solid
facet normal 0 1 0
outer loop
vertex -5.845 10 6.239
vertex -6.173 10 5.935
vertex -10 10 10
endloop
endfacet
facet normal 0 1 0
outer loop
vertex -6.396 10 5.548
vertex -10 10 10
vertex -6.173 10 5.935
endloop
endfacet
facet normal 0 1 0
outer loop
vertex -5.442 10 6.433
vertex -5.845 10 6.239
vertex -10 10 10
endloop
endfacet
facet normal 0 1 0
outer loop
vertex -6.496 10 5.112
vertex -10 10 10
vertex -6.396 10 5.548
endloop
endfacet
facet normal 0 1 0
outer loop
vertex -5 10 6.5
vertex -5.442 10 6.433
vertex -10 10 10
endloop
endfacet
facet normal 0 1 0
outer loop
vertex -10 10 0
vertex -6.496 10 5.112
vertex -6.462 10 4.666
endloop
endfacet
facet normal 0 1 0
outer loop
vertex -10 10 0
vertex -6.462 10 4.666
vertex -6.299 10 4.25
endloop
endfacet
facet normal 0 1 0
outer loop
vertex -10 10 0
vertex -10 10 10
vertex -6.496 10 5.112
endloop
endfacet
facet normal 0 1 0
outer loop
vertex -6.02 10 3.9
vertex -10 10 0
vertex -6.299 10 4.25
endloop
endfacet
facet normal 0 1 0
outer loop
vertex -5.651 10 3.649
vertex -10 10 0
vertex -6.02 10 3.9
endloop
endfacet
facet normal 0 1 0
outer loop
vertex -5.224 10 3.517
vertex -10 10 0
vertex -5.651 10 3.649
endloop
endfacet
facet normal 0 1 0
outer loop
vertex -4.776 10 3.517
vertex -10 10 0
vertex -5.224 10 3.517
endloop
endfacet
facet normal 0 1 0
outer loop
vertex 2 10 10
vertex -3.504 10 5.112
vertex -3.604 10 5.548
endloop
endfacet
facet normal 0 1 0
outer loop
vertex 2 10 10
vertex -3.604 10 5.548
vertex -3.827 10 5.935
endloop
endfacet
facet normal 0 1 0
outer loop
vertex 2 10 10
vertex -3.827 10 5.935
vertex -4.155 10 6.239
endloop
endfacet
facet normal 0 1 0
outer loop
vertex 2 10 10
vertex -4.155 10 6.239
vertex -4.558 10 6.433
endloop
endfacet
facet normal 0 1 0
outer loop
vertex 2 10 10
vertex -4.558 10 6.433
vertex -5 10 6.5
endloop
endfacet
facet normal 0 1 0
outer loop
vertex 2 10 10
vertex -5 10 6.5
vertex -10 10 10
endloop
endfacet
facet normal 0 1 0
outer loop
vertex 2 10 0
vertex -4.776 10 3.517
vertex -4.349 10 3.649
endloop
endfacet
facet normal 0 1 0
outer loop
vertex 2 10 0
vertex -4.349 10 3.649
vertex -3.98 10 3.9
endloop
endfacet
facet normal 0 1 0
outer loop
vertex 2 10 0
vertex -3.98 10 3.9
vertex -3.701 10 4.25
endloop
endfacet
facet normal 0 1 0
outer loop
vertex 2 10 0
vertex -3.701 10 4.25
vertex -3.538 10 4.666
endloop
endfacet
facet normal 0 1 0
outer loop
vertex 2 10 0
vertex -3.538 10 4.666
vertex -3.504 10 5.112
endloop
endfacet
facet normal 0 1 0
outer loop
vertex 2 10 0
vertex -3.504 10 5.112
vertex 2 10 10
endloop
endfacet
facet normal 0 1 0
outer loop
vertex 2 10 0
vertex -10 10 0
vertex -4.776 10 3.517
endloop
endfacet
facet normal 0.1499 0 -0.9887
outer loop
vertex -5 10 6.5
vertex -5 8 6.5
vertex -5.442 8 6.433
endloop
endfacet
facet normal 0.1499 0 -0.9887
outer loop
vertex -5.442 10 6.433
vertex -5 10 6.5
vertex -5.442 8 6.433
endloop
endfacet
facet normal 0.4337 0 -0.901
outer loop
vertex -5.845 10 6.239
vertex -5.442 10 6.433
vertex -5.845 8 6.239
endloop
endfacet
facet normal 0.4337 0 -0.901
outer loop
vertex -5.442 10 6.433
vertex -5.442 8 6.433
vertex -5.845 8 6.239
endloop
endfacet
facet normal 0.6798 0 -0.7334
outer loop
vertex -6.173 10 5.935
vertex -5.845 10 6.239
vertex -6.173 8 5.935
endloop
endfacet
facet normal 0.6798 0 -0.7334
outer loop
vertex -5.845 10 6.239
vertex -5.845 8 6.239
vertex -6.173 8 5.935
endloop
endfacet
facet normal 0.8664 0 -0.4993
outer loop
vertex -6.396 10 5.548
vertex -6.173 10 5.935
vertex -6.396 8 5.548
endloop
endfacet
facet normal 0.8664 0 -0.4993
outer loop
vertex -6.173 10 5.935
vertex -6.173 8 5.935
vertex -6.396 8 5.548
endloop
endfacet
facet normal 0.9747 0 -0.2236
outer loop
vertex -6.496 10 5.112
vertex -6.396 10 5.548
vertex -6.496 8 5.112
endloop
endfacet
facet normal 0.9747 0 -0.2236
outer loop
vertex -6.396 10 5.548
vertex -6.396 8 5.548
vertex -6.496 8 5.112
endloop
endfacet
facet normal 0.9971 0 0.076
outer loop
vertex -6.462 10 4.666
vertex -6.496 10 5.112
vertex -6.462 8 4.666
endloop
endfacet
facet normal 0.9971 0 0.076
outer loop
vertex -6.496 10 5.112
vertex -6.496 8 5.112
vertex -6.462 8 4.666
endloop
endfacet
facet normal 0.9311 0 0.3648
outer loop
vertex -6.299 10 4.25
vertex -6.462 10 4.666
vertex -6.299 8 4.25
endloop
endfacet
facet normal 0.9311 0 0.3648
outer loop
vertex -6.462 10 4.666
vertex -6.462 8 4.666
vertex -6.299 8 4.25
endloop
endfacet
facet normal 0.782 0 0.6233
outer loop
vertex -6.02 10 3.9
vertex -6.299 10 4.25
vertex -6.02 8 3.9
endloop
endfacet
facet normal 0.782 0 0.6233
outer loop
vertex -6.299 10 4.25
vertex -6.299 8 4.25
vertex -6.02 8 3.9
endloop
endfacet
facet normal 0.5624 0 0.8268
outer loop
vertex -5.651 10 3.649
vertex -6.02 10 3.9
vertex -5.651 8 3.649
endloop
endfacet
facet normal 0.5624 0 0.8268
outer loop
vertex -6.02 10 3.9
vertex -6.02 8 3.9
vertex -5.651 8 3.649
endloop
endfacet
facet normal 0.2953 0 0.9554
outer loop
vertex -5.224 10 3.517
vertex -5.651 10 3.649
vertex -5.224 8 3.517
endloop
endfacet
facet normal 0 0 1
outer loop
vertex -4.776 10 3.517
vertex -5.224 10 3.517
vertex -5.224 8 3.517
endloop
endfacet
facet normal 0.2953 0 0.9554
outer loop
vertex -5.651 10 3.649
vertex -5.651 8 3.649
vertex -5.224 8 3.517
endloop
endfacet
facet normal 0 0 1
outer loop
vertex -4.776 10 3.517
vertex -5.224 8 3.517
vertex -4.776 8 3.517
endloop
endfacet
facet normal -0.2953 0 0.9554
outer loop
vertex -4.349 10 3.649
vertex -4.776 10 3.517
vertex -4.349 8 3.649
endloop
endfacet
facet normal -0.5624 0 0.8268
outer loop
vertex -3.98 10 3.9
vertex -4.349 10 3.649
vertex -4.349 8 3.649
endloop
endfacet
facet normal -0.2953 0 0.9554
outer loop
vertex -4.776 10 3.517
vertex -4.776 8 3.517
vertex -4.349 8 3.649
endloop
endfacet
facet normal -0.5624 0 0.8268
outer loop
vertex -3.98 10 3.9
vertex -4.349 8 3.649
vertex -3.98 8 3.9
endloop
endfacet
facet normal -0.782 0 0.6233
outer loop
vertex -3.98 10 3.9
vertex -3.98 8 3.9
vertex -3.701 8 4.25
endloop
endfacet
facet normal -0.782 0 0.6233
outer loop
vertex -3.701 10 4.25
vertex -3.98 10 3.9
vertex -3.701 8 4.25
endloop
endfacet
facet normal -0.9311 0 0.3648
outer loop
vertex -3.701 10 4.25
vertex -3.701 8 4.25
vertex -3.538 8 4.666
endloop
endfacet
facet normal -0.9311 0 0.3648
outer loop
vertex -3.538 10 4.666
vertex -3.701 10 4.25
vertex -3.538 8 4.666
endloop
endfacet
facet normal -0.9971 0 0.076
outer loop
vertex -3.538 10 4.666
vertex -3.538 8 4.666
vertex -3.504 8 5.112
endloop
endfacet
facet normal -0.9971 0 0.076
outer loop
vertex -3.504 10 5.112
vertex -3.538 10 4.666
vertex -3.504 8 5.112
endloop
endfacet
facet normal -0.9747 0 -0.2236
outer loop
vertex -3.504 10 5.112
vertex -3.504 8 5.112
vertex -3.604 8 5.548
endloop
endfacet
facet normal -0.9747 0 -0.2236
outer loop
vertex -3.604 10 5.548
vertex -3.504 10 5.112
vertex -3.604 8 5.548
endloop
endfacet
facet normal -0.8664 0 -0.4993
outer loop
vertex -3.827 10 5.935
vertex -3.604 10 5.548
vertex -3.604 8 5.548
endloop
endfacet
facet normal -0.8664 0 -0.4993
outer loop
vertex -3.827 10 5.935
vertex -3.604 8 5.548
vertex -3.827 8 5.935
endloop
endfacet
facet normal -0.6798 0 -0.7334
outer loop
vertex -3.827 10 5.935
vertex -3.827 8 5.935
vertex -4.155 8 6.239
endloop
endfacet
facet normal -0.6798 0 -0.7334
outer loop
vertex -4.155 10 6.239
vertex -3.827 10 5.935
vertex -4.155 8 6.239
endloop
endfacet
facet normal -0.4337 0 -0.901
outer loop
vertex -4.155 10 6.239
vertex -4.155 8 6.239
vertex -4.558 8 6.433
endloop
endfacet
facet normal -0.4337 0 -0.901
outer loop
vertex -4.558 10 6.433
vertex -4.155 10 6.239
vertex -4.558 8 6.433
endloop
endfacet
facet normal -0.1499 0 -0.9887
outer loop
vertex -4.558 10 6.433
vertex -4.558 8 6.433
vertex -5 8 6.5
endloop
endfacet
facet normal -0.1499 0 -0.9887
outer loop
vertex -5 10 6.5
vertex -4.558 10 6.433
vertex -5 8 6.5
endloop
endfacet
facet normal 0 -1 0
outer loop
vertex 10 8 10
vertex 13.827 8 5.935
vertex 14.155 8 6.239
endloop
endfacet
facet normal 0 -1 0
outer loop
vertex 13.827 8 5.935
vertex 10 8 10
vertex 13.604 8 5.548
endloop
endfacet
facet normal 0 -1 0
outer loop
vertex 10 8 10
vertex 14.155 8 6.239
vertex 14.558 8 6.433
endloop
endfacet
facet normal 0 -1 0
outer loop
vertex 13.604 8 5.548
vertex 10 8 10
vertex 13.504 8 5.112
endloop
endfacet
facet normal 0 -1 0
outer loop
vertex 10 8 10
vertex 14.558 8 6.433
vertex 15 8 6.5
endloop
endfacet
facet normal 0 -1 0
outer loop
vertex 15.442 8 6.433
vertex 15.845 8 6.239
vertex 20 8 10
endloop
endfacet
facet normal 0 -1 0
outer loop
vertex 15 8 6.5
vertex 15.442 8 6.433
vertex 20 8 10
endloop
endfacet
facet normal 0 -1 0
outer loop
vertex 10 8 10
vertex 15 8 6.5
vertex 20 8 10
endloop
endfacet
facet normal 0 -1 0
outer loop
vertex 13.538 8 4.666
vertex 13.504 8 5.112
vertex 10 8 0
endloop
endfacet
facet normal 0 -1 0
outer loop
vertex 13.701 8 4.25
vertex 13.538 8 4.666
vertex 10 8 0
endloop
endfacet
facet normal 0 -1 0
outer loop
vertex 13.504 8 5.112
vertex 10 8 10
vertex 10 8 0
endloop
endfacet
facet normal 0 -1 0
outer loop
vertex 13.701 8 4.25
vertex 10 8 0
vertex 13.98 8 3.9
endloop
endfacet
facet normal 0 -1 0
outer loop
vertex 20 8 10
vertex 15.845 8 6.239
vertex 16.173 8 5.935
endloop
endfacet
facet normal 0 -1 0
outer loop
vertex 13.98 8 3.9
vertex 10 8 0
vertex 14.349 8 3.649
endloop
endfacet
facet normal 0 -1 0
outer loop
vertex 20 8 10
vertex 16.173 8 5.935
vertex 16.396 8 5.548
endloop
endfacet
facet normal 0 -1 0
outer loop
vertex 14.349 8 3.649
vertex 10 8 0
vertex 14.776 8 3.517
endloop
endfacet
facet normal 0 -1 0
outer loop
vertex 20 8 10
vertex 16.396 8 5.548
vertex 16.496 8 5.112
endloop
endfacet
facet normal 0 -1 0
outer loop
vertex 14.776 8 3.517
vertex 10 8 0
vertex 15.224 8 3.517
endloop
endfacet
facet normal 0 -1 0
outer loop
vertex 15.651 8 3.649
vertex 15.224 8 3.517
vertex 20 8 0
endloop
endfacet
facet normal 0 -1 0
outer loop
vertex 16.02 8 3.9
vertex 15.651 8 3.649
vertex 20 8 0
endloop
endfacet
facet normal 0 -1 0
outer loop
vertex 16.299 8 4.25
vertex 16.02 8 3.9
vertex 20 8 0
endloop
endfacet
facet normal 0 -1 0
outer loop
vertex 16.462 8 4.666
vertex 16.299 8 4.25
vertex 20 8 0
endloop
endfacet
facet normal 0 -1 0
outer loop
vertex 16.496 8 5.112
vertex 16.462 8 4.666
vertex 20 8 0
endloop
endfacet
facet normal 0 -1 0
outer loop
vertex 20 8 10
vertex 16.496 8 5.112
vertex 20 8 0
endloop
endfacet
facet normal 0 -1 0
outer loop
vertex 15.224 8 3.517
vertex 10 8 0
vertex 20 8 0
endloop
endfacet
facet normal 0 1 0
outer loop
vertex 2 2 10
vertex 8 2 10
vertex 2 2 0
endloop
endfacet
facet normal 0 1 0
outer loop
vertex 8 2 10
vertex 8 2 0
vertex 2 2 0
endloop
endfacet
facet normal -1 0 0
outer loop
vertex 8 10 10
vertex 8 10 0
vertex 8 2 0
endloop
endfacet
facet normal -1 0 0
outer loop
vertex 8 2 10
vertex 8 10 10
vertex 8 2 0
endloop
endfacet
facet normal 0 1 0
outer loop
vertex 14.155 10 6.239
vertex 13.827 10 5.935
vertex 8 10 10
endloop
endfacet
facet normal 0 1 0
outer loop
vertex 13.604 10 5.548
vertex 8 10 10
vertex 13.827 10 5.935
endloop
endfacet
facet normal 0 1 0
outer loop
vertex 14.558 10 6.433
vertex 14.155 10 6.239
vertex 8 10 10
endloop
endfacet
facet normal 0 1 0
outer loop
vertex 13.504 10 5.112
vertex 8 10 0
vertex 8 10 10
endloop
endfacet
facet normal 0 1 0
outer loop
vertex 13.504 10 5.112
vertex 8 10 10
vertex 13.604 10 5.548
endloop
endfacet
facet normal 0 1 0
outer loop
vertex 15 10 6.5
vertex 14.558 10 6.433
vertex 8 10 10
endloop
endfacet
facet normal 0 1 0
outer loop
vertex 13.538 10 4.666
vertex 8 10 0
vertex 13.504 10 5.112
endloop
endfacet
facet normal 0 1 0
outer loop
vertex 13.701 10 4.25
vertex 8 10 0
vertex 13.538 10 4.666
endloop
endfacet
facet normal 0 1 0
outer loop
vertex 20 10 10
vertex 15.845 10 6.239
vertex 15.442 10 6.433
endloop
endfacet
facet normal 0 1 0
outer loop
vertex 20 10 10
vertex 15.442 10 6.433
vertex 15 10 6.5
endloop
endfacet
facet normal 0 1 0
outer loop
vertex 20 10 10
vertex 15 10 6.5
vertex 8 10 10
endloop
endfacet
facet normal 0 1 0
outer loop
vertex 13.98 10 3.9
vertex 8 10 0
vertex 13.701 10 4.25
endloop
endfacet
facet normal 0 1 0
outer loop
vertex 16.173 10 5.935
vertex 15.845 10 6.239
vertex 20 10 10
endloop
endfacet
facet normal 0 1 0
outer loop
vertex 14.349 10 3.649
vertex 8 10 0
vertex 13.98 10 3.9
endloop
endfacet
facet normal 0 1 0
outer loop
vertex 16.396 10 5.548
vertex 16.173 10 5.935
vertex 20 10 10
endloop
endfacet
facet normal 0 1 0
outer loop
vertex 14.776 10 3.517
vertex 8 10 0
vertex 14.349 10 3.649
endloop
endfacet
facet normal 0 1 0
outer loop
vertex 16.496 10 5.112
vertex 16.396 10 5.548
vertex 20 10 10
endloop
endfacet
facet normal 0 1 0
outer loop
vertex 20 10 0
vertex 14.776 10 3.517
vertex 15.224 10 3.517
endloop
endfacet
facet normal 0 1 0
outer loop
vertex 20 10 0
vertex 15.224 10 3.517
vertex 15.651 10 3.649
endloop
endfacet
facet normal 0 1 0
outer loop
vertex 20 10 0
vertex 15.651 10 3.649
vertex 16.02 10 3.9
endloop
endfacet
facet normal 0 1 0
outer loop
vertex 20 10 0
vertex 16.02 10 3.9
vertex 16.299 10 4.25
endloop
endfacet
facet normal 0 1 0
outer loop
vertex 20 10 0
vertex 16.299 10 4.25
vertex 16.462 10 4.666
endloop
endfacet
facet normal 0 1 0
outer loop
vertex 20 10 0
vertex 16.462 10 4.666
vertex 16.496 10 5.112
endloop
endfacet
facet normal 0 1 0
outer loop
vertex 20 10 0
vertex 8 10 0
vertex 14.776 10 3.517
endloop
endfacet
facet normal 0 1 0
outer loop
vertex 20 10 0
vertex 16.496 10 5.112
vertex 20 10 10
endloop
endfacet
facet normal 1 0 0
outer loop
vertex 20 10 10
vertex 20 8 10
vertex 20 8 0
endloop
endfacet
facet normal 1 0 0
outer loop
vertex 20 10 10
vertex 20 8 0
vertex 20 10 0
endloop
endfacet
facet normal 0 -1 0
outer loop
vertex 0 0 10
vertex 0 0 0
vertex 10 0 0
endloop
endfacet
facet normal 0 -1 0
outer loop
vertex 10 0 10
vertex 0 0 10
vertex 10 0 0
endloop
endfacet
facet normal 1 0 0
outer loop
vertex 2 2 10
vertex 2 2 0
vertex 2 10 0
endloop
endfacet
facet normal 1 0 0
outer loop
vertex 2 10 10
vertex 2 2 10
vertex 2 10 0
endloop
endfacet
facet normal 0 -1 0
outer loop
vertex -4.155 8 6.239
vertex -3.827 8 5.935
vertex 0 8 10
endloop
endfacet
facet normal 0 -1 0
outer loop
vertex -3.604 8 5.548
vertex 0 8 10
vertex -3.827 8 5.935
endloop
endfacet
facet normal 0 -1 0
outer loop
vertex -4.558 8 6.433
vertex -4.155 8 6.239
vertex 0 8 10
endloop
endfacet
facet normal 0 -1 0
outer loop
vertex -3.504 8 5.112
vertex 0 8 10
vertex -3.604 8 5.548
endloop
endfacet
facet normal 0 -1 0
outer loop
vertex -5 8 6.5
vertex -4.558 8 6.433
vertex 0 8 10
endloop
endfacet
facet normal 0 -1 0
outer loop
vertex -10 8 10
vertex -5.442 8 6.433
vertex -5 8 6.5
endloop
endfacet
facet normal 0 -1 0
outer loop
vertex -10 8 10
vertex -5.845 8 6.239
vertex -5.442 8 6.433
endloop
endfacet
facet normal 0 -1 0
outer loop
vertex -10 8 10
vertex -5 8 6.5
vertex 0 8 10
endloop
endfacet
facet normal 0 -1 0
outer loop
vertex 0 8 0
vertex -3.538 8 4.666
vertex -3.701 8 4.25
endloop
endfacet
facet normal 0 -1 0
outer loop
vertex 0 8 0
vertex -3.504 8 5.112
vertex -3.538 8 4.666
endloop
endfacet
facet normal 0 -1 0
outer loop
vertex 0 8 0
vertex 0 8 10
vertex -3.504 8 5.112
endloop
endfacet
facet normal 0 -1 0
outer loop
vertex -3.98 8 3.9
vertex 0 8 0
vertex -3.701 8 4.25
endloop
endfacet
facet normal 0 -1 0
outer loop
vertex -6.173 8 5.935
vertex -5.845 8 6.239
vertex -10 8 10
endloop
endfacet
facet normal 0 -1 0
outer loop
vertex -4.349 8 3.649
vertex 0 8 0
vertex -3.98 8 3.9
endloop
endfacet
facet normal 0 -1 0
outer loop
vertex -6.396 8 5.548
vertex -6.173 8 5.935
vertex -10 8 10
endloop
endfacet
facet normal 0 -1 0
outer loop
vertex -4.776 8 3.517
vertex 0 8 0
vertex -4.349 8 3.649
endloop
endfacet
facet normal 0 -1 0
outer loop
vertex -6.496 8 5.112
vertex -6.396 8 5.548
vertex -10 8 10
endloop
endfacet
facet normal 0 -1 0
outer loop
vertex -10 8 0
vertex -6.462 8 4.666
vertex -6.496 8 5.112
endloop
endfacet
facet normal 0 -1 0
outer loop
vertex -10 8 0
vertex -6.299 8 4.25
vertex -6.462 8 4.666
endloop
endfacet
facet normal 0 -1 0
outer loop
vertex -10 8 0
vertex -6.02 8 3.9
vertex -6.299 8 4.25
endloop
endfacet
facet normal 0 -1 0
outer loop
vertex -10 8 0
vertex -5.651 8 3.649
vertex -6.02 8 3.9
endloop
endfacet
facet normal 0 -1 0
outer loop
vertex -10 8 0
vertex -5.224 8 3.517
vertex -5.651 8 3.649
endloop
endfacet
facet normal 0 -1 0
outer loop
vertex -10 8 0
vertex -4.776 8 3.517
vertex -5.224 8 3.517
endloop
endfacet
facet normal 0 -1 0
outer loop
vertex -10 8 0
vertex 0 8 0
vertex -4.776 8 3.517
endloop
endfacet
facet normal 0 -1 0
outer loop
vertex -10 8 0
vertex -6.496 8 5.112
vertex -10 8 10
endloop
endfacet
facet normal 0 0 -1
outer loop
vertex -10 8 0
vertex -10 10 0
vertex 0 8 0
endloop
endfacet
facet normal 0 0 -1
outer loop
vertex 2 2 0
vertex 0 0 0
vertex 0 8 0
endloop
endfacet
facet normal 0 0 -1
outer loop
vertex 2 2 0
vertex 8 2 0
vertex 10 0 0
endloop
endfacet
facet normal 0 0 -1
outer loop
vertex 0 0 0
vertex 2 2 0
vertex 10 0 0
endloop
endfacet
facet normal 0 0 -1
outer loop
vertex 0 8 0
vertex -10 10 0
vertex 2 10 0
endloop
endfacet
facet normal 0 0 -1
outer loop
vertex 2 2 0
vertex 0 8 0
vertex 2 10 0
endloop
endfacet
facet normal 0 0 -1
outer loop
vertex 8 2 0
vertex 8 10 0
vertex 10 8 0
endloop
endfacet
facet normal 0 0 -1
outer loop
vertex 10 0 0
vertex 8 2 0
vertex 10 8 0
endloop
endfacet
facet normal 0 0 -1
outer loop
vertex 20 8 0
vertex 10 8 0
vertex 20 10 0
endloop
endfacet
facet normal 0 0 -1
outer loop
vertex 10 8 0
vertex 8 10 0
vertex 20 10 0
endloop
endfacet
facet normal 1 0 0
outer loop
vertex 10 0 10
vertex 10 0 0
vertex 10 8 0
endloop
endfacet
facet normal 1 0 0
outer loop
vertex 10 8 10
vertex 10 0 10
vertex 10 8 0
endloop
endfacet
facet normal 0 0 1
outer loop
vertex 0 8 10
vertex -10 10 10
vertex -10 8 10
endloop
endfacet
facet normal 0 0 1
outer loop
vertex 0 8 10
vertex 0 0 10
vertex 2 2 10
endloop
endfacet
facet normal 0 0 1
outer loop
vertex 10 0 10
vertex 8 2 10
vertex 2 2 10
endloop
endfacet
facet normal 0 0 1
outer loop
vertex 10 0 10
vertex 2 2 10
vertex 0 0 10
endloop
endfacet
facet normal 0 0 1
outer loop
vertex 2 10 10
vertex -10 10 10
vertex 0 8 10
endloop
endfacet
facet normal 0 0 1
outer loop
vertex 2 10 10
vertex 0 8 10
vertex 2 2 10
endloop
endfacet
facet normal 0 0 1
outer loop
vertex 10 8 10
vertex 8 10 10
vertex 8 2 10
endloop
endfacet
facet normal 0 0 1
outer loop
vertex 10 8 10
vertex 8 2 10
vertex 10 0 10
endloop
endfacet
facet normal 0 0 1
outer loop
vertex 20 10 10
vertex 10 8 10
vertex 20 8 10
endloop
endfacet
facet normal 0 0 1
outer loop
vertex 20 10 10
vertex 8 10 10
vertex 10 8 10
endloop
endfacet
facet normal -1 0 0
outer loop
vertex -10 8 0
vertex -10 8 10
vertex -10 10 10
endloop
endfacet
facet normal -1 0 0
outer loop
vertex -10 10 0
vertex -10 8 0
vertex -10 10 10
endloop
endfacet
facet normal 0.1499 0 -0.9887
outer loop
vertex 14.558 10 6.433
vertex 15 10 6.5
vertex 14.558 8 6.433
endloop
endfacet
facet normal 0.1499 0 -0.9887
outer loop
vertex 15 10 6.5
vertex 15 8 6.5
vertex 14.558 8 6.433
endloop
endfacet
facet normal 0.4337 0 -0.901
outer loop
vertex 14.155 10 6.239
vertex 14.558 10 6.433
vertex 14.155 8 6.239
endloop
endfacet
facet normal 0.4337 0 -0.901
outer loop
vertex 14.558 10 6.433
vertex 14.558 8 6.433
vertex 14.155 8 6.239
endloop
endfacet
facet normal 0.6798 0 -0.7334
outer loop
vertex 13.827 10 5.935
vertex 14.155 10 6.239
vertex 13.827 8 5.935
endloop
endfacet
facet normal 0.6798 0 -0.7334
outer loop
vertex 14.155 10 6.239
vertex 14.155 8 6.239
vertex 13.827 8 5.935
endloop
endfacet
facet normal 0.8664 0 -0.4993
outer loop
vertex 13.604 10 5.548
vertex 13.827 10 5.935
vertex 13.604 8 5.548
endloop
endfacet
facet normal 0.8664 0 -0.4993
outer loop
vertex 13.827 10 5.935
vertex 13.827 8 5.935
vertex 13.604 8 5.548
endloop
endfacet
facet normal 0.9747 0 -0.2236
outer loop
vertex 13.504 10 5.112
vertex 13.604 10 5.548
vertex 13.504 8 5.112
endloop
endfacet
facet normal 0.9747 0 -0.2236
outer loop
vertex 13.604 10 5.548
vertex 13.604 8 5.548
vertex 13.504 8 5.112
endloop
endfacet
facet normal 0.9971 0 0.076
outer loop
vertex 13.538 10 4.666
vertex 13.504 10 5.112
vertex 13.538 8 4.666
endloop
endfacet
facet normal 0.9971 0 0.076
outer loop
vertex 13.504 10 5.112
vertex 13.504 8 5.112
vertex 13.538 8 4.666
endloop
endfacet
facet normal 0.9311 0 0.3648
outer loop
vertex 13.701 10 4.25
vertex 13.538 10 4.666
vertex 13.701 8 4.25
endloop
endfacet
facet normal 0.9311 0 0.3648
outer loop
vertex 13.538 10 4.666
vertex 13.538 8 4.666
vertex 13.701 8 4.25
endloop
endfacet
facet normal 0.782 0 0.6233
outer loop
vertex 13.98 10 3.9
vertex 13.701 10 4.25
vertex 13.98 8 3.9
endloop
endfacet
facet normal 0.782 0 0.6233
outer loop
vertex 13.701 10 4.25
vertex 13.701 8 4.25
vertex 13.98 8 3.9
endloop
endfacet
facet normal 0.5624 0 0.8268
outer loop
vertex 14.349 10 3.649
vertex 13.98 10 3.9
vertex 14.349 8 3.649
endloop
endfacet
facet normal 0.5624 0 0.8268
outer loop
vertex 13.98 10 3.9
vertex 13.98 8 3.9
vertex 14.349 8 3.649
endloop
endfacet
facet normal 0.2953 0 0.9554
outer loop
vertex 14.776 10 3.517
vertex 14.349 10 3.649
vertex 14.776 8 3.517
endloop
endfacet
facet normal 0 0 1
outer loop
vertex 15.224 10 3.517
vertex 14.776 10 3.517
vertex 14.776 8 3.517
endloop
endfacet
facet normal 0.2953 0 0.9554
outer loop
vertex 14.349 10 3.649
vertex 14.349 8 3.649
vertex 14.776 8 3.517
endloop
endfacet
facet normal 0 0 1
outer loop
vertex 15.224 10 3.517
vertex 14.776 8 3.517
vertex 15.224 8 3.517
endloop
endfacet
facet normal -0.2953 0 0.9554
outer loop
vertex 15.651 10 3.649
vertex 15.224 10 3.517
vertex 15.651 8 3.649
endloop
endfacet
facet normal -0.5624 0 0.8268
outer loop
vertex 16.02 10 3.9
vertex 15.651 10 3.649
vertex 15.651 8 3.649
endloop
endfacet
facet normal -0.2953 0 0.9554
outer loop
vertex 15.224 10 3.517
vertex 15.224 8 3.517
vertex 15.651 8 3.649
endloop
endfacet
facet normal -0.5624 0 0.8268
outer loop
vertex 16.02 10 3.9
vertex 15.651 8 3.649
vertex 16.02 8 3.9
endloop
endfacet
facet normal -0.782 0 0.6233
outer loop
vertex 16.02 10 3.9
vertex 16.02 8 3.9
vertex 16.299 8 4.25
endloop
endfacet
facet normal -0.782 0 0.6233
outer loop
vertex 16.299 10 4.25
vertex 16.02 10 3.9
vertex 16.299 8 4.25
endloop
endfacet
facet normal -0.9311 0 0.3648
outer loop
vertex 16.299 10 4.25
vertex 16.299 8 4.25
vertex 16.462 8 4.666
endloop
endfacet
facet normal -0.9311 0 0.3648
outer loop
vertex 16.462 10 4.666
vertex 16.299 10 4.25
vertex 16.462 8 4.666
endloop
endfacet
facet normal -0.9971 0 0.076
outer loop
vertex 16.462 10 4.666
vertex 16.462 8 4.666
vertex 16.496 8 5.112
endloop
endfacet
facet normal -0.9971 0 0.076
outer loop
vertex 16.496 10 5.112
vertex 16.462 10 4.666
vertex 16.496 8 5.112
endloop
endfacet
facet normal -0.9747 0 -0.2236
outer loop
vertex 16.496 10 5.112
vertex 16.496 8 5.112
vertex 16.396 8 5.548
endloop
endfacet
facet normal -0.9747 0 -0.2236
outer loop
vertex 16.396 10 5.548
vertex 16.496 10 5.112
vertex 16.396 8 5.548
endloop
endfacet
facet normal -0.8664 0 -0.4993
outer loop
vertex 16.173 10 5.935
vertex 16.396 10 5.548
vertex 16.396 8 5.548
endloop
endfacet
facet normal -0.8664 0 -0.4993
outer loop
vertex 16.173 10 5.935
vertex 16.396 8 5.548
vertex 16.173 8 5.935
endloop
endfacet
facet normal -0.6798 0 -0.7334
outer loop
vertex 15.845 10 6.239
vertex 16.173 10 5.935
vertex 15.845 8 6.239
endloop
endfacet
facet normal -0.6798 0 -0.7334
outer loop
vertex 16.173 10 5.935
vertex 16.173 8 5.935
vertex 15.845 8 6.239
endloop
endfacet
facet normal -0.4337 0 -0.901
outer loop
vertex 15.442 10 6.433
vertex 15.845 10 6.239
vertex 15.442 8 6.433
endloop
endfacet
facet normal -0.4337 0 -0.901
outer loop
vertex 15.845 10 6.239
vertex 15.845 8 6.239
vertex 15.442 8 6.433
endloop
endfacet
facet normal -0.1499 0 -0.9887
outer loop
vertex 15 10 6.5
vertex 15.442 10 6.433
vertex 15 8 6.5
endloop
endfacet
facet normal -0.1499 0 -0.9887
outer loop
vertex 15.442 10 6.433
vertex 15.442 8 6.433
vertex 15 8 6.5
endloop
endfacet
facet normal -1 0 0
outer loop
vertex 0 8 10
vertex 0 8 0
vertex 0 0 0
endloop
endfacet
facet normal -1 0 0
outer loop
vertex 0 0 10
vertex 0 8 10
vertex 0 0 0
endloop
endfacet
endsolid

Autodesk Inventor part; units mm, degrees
ref_plane "YZ Plane" through (0, 0, 0) normal (1, 0, 0) x (0, 1, 0)
ref_plane "XZ Plane" through (0, 0, 0) normal (0, 1, 0) x (-1, 0, 0)
ref_plane "XY Plane" through (0, 0, 0) normal (0, 0, 1) x (1, 0, 0)
sketch "Sketch1" plane through (0, 0, 0) normal (0, 0, 1) x (1, 0, 0)
  line L0 (0, 0) -> (10, 0)
  line L1 (10, 0) -> (10, 8)
  line L2 (0, 8) -> (0, 0)
  line L3 (8, 10) -> (8, 2)
  line L4 (8, 2) -> (2, 2)
  line L5 (2, 2) -> (2, 8)
  line L6 (0, 8) -> (-10, 8)
  line L7 (-10, 8) -> (-10, 10)
  line L8 (10, 8) -> (20, 8)
  line L9 (20, 8) -> (20, 10)
  line L10 (2, 8) -> (2, 10)
  line L11 (-10, 10) -> (2, 10)
  line L12 (8, 10) -> (20, 10)
  line L13 (10, 10) -> (8, 10)
  line L14 (2, 10) -> (0, 10)
  dimension "d3" = 10
  dimension "d4" = 10
extrude "Extrusion1" add sketch "Sketch1" along normal blind 10
sketch "Sketch2" plane through (-10, 10, 0) normal (0, 1, 0) x (1, 0, 0)
  line L0 (12, -10) -> (0, -10) projected
  line L1 (0, 0) -> (0, -10) projected
  line L2 (30, 0) -> (18, 0) projected
  line L3 (30, 0) -> (30, -10) projected
  point P0 (10, 0)
  point P1 (5, -5)
  point P2 (25, -5)
  dimension "d14" = 5
  dimension "d15" = 5
  dimension "d16" = 5
  dimension "d17" = 5
hole "Hole1" at (-5, 10, 5) at (15, 10, 5) direction (0, -1, 0) diameter 3 end through all
properties part number "CAM_HOLD"
